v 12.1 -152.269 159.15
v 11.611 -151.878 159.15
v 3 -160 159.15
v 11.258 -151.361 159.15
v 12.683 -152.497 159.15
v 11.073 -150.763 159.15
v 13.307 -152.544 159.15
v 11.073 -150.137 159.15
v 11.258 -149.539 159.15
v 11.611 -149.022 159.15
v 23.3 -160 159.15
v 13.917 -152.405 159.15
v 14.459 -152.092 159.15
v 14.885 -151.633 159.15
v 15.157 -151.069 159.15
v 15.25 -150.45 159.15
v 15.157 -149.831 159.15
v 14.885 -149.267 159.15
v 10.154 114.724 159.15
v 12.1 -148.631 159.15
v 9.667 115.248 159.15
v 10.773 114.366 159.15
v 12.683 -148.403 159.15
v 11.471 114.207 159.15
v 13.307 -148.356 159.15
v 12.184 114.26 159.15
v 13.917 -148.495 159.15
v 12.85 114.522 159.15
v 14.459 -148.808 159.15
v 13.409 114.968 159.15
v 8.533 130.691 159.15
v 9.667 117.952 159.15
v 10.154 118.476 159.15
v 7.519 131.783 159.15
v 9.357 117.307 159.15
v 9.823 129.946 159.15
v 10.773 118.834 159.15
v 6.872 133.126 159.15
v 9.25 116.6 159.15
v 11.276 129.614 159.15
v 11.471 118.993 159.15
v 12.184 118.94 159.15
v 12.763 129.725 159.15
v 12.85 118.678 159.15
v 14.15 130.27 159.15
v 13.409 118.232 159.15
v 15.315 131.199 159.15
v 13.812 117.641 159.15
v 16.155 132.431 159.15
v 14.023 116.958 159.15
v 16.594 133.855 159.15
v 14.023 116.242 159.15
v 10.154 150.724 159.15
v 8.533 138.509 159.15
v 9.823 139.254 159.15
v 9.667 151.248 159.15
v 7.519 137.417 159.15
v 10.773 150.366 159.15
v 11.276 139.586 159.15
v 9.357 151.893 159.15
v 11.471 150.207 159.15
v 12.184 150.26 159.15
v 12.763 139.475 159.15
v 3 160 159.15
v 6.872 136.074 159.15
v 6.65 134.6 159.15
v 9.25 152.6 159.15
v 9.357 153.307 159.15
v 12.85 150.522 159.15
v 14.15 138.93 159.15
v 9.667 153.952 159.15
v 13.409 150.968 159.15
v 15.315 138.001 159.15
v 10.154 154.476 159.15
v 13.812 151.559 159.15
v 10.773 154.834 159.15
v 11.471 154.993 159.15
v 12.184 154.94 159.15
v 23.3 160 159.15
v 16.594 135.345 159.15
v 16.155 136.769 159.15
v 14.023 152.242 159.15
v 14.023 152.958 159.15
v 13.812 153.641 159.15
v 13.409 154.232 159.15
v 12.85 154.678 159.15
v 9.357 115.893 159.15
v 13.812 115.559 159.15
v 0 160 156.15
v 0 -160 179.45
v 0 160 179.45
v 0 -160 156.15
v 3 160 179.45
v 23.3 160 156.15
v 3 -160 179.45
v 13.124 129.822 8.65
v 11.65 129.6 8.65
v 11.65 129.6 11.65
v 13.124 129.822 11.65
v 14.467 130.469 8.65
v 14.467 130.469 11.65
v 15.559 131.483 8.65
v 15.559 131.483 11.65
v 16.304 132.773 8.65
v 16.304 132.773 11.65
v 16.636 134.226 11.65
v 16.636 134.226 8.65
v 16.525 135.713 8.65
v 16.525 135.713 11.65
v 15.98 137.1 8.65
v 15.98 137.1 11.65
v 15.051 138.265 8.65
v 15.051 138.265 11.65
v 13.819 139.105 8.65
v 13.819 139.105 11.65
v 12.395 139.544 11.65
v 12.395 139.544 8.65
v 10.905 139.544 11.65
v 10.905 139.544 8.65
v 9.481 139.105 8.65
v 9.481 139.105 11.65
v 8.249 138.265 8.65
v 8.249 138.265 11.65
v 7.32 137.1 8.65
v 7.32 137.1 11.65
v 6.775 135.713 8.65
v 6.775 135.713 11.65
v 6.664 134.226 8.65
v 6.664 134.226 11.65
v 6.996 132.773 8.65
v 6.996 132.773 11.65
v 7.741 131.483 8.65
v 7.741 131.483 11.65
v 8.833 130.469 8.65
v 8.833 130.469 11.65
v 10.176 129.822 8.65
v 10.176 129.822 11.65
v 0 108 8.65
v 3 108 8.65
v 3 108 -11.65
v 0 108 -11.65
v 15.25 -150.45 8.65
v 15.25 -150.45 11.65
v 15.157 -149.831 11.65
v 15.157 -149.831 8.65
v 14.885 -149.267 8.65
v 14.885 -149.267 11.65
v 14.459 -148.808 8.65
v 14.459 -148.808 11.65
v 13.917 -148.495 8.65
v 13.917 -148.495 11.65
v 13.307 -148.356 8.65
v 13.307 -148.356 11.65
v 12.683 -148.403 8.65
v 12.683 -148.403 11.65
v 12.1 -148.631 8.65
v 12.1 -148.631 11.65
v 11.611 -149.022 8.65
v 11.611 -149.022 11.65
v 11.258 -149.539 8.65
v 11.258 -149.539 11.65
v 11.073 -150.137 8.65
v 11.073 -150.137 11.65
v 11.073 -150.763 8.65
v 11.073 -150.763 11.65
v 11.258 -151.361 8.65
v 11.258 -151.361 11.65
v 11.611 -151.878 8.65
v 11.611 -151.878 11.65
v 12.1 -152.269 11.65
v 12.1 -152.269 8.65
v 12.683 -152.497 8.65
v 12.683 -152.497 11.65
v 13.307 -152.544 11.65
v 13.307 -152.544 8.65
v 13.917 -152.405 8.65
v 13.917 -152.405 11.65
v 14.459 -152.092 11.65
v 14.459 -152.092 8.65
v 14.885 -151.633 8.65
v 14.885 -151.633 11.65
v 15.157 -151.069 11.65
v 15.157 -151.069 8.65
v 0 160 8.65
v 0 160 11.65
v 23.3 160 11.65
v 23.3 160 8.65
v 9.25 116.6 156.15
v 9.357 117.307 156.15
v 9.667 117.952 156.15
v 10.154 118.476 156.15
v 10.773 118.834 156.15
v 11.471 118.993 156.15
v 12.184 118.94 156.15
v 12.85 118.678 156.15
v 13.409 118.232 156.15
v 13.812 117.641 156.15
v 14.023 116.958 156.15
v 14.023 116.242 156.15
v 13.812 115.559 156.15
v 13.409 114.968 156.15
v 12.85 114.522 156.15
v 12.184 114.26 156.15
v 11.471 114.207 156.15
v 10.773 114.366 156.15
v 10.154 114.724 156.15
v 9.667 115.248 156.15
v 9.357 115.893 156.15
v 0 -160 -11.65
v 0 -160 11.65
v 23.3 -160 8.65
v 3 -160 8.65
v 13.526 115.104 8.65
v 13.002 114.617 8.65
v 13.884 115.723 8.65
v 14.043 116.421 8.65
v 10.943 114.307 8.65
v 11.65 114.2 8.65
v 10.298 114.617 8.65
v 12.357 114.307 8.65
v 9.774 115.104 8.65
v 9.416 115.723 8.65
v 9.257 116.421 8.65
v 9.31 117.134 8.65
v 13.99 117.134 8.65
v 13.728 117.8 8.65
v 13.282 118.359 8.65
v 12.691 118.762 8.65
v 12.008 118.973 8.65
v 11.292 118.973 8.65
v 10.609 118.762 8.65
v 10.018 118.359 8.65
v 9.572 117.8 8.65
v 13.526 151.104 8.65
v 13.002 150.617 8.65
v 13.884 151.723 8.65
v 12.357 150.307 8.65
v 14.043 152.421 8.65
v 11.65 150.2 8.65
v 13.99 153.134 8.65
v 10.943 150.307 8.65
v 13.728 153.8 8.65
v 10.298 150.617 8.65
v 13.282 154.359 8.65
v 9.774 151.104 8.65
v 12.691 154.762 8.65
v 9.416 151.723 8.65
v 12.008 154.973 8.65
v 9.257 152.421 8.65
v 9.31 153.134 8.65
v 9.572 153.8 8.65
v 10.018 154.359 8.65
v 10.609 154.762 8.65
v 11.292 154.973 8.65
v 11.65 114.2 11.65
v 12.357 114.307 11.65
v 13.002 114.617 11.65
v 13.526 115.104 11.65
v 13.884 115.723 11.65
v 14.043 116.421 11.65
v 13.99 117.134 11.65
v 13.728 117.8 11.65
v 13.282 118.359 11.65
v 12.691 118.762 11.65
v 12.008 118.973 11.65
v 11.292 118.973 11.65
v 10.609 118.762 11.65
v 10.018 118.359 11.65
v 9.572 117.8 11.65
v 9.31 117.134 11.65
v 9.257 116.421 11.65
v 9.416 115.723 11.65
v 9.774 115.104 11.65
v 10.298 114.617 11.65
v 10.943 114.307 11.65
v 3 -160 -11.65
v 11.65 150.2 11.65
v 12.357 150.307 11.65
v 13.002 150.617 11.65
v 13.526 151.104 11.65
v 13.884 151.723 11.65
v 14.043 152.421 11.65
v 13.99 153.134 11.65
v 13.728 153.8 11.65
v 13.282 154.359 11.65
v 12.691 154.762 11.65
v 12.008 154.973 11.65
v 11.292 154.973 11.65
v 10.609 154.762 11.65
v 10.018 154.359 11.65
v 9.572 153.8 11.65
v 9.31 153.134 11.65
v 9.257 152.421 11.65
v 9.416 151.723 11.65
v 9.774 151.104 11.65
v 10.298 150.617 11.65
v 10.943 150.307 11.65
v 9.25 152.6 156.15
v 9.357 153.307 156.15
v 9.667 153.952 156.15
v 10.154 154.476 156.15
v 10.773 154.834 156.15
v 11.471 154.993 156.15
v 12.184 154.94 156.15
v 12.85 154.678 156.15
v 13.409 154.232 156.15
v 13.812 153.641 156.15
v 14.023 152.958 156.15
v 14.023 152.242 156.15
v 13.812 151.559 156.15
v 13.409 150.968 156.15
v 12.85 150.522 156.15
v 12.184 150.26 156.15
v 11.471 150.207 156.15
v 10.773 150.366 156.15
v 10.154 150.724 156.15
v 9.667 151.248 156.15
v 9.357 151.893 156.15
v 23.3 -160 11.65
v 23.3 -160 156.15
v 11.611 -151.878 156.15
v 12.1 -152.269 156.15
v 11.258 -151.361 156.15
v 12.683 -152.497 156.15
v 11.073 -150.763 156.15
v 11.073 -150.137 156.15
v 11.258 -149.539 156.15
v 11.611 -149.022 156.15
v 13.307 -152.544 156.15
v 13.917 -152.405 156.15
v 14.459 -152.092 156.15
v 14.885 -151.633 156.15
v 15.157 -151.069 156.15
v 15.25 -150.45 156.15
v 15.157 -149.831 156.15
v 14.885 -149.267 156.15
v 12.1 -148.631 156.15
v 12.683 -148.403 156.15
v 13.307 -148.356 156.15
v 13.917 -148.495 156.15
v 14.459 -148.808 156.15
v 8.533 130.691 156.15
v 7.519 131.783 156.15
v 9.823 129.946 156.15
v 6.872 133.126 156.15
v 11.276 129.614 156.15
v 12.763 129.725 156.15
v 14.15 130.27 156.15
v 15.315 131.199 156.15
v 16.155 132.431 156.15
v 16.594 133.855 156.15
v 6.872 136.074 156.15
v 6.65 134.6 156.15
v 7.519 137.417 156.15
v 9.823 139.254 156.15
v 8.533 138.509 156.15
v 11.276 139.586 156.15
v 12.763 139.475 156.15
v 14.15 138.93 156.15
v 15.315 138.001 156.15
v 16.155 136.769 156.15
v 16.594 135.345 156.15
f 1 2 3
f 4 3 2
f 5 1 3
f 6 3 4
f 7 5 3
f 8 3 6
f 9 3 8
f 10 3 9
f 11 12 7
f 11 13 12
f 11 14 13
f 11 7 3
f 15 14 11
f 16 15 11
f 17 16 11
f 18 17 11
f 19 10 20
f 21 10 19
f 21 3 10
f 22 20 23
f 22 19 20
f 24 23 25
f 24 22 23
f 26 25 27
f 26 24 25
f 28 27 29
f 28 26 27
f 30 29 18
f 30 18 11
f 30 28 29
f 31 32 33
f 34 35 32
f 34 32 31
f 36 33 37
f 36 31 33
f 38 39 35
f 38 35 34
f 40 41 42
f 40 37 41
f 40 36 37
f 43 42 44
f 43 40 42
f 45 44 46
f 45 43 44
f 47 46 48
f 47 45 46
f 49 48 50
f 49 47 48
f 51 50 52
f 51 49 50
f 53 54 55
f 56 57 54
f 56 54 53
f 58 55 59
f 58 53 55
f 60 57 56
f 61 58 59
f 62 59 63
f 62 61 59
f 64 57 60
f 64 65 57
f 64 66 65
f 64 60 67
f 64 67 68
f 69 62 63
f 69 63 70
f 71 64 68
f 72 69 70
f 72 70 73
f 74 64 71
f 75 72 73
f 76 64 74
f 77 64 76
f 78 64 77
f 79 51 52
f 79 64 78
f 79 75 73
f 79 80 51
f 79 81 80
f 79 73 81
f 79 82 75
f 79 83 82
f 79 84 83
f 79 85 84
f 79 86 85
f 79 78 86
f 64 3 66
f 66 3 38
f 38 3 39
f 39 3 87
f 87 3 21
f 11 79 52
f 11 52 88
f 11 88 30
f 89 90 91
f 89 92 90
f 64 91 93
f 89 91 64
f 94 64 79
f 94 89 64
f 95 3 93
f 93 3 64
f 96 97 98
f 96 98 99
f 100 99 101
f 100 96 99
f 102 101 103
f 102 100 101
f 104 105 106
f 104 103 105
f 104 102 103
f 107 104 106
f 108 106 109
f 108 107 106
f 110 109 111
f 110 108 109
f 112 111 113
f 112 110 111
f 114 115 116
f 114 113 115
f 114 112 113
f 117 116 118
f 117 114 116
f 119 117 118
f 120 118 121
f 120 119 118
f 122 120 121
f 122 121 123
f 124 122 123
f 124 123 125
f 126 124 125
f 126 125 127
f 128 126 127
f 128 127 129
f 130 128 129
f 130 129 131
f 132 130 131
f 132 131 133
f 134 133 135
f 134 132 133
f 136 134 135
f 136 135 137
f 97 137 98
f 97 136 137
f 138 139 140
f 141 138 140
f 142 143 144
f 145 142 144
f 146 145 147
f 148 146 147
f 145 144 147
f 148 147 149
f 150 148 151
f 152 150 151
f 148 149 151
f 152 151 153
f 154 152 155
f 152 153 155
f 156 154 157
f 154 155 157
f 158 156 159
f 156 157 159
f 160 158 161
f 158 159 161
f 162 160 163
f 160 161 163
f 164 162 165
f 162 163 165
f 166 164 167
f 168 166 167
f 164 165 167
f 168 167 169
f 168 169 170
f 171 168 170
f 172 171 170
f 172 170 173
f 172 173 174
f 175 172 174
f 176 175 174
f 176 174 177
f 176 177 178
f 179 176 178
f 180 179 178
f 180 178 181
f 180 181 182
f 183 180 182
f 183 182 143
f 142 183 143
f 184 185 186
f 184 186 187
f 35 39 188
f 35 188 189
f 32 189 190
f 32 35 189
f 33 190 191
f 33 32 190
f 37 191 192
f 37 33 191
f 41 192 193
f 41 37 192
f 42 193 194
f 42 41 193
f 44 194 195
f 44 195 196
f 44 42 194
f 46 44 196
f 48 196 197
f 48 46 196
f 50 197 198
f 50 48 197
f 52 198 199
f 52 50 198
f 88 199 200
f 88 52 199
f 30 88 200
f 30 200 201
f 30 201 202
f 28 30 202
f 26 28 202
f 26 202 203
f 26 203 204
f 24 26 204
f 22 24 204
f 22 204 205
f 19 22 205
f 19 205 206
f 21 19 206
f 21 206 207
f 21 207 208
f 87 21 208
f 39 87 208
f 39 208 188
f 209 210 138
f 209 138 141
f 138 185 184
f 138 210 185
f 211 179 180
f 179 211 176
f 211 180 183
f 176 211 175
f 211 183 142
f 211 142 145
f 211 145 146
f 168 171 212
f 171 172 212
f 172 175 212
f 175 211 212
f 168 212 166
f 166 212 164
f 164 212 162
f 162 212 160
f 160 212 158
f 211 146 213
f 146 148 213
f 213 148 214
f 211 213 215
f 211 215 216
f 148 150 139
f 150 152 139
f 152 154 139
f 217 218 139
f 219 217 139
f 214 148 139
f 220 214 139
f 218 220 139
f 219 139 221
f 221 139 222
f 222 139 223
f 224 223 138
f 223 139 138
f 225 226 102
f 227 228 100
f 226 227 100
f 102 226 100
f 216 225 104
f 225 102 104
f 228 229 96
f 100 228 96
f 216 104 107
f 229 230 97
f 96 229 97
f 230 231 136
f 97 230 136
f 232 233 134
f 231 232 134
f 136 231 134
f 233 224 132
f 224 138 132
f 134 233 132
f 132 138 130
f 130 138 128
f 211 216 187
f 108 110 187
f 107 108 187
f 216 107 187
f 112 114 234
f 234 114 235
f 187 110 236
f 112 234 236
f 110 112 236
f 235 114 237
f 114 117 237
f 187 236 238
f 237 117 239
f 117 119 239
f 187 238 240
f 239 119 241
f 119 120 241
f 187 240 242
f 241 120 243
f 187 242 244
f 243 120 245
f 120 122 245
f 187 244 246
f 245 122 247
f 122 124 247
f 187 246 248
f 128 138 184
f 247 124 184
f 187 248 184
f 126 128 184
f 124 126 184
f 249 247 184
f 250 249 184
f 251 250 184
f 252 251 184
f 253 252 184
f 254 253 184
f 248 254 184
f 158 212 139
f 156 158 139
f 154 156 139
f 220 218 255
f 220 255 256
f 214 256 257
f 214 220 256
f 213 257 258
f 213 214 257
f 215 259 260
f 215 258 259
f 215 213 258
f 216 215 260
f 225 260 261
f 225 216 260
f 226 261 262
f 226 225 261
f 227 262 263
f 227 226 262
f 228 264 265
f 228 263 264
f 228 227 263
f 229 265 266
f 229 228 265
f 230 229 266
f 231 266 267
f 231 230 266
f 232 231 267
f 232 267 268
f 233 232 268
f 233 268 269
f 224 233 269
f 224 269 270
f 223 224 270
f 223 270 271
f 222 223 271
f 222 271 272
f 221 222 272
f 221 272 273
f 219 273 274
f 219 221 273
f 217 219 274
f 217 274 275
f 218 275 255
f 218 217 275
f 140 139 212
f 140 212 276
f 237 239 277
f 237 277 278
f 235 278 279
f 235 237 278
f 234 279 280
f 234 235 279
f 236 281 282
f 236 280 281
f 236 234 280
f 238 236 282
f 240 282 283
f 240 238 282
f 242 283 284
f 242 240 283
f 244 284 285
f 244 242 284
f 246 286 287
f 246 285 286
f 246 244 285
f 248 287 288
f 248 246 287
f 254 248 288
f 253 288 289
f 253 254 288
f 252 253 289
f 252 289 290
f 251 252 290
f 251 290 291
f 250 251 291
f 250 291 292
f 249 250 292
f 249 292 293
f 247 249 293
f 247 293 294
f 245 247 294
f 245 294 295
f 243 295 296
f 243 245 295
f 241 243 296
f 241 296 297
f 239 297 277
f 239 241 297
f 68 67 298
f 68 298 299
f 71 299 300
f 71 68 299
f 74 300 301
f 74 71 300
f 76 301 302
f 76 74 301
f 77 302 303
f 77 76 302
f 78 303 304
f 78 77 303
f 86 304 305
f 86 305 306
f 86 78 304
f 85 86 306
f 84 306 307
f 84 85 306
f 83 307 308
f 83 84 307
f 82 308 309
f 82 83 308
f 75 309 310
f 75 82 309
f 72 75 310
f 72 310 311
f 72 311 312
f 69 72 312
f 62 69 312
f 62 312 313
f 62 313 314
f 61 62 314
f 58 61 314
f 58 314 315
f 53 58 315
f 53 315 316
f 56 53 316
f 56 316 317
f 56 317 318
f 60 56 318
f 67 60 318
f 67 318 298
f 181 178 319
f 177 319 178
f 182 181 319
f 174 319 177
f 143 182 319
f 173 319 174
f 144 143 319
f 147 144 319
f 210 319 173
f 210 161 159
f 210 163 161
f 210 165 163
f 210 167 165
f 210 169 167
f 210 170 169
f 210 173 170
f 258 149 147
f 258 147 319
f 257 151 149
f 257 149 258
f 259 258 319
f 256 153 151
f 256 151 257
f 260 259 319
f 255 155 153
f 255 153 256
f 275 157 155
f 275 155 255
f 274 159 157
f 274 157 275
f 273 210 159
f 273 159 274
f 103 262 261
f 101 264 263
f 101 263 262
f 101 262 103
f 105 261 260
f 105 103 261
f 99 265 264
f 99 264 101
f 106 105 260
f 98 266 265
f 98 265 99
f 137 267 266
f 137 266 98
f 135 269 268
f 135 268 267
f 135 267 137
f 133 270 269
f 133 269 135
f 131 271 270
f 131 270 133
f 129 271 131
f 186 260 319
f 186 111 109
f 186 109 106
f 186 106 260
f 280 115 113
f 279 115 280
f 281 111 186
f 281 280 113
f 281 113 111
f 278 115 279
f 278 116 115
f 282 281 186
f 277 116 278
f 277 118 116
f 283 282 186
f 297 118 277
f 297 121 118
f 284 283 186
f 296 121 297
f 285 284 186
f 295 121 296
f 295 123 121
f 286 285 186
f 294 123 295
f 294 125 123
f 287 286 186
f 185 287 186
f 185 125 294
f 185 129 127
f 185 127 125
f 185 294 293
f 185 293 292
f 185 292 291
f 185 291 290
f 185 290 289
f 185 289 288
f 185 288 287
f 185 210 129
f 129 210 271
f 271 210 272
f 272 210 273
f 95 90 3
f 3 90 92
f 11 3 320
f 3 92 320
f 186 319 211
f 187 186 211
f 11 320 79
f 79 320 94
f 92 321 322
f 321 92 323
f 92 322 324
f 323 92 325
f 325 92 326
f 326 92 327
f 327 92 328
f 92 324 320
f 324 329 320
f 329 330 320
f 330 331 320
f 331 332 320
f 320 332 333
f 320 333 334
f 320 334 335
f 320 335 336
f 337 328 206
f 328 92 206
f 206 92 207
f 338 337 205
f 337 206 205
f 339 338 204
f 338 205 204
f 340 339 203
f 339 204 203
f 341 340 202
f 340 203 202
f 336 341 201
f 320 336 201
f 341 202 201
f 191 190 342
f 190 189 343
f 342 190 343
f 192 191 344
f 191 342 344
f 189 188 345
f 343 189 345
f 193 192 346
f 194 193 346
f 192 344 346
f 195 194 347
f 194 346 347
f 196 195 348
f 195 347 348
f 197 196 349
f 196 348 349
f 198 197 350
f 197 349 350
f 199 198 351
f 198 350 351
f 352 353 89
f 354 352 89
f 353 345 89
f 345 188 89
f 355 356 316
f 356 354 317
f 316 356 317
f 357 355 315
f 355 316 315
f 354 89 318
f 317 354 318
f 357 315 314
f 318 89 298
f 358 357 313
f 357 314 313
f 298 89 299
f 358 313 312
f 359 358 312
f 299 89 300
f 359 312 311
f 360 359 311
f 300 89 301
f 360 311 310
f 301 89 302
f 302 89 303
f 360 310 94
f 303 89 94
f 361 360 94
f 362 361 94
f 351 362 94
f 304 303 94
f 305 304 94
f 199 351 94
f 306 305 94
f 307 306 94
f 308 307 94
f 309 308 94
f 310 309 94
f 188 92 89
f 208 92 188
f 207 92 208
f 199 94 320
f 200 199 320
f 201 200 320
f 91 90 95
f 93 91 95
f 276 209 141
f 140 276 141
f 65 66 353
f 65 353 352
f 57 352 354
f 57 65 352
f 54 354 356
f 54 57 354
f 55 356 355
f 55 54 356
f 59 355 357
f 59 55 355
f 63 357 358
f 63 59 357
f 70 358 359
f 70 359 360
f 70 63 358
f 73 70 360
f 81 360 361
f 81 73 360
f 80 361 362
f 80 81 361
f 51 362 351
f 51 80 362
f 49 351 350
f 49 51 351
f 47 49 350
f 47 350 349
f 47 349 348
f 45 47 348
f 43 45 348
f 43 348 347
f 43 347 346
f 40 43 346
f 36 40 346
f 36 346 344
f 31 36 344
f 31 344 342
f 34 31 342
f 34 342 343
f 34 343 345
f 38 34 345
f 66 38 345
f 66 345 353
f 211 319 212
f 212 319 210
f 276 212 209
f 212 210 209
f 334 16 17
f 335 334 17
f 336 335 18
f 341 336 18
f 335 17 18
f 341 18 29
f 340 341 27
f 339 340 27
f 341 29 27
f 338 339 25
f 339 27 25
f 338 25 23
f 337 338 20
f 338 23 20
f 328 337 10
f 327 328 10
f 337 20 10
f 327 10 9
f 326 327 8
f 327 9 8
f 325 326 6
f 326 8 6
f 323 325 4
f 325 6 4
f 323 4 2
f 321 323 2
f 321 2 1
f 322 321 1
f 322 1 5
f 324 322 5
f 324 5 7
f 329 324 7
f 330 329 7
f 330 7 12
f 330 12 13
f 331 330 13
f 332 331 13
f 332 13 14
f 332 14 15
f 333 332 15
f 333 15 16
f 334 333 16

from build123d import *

# Parameters (mm, degrees)
SKETCH1_W               = 23.3
SKETCH1_H               = 320
BOSS_EXTRUDE1_DEPTH     = 3
SKETCH2_W               = 3
SKETCH2_H               = 320
BOSS_EXTRUDE2_DEPTH     = 20.3
CUT_EXTRUDE1_DEPTH      = 34.3
CUT_EXTRUDE1_DEPTH_BACK = 20.3
SKETCH3_R               = 5
SKETCH3_R_2             = 2.4
SKETCH5_W               = 23.3
SKETCH5_H               = 320
BOSS_EXTRUDE3_DEPTH     = 3
SKETCH6_W               = 3
SKETCH6_H               = 320
BOSS_EXTRUDE4_DEPTH     = 20.3
CUT_EXTRUDE2_START      = -20.3
SKETCH7_R               = 5
SKETCH7_R_2             = 2.4
CUT_EXTRUDE2_DEPTH      = 20.3
SKETCH9_R               = 2.1
CUT_EXTRUDE3_DEPTH      = 151
SKETCH10_W              = 20.3
SKETCH10_H              = 52
CUT_EXTRUDE4_DEPTH      = 151


with BuildPart() as part:
    # Sketch1 → Boss-Extrude1 (new body)
    with BuildSketch(Plane(origin=(0, 0, 0), x_dir=(0, 0, -1), z_dir=(1, 0, 0))):
        Rectangle(SKETCH1_W, SKETCH1_H)
    extrude(amount=BOSS_EXTRUDE1_DEPTH)

    # Sketch2 → Boss-Extrude2 (add)
    with BuildSketch(Plane(origin=(3, 0, 0), x_dir=(0, 0, -1), z_dir=(1, 0, 0))):
        with Locations((-10.15, 0)):
            Rectangle(SKETCH2_W, SKETCH2_H)
    extrude(amount=BOSS_EXTRUDE2_DEPTH)

    # Sketch3 → Cut-Extrude1 (cut, two sides: drawn at the far end of the back side and taken through both)
    with BuildSketch(Plane.XY.offset(11.65).offset(-CUT_EXTRUDE1_DEPTH_BACK)):
        with Locations(Location((11.65, 134.6, 0), (0, 0, 270))):
            Circle(SKETCH3_R)
        with Locations(Location((11.65, 152.6, 0), (0, 0, 270))):
            Circle(SKETCH3_R_2)
        with Locations(Location((11.65, 116.6, 0), (0, 0, 270))):
            Circle(SKETCH3_R_2)
    extrude(amount=CUT_EXTRUDE1_DEPTH + CUT_EXTRUDE1_DEPTH_BACK, mode=Mode.SUBTRACT)


with BuildPart() as body_2:
    # Sketch5 → Boss-Extrude3 (new body)
    with BuildSketch(Plane.XY.offset(156.15)):
        with Locations((11.65, 0)):
            Rectangle(SKETCH5_W, SKETCH5_H)
    extrude(amount=BOSS_EXTRUDE3_DEPTH)

    # Sketch6 → Boss-Extrude4 (add)
    with BuildSketch(Plane.XY.offset(159.15)):
        with Locations((1.5, 0)):
            Rectangle(SKETCH6_W, SKETCH6_H)
    extrude(amount=BOSS_EXTRUDE4_DEPTH)

    # Sketch7 → Cut-Extrude2 (cut)
    with BuildSketch(Plane(origin=(0, 0, 156.15), x_dir=(-1, 0, 0), z_dir=(0, 0, -1)).offset(CUT_EXTRUDE2_START)):
        with Locations((-11.65, 134.6)):
            Circle(SKETCH7_R)
        with Locations((-11.65, 116.6)):
            Circle(SKETCH7_R_2)
        with Locations((-11.65, 152.6)):
            Circle(SKETCH7_R_2)
    extrude(amount=CUT_EXTRUDE2_DEPTH, mode=Mode.SUBTRACT)


with BuildPart() as cut_extrude3_tool:
    # Sketch9 → Cut-Extrude3 (new body)
    with BuildSketch(Plane.XY.offset(159.15)):
        with Locations((13.15, -150.45)):
            Circle(SKETCH9_R)
    extrude(amount=-CUT_EXTRUDE3_DEPTH)


with BuildPart() as part_1:
    add(part.part)

    # Cut-Extrude3: cut by cut_extrude3_tool
    add(cut_extrude3_tool.part, mode=Mode.SUBTRACT)

    # Sketch10 → Cut-Extrude4 (cut)
    with BuildSketch(Plane(origin=(3, 0, 0), x_dir=(0, 0, -1), z_dir=(1, 0, 0))):
        with Locations((1.5, 134)):
            Rectangle(SKETCH10_W, SKETCH10_H)
    extrude(amount=-CUT_EXTRUDE4_DEPTH, mode=Mode.SUBTRACT)


with BuildPart() as body_2_1:
    add(body_2.part)

    # Cut-Extrude3: cut by cut_extrude3_tool
    add(cut_extrude3_tool.part, mode=Mode.SUBTRACT)


solid = Compound([part_1.part, body_2_1.part])
